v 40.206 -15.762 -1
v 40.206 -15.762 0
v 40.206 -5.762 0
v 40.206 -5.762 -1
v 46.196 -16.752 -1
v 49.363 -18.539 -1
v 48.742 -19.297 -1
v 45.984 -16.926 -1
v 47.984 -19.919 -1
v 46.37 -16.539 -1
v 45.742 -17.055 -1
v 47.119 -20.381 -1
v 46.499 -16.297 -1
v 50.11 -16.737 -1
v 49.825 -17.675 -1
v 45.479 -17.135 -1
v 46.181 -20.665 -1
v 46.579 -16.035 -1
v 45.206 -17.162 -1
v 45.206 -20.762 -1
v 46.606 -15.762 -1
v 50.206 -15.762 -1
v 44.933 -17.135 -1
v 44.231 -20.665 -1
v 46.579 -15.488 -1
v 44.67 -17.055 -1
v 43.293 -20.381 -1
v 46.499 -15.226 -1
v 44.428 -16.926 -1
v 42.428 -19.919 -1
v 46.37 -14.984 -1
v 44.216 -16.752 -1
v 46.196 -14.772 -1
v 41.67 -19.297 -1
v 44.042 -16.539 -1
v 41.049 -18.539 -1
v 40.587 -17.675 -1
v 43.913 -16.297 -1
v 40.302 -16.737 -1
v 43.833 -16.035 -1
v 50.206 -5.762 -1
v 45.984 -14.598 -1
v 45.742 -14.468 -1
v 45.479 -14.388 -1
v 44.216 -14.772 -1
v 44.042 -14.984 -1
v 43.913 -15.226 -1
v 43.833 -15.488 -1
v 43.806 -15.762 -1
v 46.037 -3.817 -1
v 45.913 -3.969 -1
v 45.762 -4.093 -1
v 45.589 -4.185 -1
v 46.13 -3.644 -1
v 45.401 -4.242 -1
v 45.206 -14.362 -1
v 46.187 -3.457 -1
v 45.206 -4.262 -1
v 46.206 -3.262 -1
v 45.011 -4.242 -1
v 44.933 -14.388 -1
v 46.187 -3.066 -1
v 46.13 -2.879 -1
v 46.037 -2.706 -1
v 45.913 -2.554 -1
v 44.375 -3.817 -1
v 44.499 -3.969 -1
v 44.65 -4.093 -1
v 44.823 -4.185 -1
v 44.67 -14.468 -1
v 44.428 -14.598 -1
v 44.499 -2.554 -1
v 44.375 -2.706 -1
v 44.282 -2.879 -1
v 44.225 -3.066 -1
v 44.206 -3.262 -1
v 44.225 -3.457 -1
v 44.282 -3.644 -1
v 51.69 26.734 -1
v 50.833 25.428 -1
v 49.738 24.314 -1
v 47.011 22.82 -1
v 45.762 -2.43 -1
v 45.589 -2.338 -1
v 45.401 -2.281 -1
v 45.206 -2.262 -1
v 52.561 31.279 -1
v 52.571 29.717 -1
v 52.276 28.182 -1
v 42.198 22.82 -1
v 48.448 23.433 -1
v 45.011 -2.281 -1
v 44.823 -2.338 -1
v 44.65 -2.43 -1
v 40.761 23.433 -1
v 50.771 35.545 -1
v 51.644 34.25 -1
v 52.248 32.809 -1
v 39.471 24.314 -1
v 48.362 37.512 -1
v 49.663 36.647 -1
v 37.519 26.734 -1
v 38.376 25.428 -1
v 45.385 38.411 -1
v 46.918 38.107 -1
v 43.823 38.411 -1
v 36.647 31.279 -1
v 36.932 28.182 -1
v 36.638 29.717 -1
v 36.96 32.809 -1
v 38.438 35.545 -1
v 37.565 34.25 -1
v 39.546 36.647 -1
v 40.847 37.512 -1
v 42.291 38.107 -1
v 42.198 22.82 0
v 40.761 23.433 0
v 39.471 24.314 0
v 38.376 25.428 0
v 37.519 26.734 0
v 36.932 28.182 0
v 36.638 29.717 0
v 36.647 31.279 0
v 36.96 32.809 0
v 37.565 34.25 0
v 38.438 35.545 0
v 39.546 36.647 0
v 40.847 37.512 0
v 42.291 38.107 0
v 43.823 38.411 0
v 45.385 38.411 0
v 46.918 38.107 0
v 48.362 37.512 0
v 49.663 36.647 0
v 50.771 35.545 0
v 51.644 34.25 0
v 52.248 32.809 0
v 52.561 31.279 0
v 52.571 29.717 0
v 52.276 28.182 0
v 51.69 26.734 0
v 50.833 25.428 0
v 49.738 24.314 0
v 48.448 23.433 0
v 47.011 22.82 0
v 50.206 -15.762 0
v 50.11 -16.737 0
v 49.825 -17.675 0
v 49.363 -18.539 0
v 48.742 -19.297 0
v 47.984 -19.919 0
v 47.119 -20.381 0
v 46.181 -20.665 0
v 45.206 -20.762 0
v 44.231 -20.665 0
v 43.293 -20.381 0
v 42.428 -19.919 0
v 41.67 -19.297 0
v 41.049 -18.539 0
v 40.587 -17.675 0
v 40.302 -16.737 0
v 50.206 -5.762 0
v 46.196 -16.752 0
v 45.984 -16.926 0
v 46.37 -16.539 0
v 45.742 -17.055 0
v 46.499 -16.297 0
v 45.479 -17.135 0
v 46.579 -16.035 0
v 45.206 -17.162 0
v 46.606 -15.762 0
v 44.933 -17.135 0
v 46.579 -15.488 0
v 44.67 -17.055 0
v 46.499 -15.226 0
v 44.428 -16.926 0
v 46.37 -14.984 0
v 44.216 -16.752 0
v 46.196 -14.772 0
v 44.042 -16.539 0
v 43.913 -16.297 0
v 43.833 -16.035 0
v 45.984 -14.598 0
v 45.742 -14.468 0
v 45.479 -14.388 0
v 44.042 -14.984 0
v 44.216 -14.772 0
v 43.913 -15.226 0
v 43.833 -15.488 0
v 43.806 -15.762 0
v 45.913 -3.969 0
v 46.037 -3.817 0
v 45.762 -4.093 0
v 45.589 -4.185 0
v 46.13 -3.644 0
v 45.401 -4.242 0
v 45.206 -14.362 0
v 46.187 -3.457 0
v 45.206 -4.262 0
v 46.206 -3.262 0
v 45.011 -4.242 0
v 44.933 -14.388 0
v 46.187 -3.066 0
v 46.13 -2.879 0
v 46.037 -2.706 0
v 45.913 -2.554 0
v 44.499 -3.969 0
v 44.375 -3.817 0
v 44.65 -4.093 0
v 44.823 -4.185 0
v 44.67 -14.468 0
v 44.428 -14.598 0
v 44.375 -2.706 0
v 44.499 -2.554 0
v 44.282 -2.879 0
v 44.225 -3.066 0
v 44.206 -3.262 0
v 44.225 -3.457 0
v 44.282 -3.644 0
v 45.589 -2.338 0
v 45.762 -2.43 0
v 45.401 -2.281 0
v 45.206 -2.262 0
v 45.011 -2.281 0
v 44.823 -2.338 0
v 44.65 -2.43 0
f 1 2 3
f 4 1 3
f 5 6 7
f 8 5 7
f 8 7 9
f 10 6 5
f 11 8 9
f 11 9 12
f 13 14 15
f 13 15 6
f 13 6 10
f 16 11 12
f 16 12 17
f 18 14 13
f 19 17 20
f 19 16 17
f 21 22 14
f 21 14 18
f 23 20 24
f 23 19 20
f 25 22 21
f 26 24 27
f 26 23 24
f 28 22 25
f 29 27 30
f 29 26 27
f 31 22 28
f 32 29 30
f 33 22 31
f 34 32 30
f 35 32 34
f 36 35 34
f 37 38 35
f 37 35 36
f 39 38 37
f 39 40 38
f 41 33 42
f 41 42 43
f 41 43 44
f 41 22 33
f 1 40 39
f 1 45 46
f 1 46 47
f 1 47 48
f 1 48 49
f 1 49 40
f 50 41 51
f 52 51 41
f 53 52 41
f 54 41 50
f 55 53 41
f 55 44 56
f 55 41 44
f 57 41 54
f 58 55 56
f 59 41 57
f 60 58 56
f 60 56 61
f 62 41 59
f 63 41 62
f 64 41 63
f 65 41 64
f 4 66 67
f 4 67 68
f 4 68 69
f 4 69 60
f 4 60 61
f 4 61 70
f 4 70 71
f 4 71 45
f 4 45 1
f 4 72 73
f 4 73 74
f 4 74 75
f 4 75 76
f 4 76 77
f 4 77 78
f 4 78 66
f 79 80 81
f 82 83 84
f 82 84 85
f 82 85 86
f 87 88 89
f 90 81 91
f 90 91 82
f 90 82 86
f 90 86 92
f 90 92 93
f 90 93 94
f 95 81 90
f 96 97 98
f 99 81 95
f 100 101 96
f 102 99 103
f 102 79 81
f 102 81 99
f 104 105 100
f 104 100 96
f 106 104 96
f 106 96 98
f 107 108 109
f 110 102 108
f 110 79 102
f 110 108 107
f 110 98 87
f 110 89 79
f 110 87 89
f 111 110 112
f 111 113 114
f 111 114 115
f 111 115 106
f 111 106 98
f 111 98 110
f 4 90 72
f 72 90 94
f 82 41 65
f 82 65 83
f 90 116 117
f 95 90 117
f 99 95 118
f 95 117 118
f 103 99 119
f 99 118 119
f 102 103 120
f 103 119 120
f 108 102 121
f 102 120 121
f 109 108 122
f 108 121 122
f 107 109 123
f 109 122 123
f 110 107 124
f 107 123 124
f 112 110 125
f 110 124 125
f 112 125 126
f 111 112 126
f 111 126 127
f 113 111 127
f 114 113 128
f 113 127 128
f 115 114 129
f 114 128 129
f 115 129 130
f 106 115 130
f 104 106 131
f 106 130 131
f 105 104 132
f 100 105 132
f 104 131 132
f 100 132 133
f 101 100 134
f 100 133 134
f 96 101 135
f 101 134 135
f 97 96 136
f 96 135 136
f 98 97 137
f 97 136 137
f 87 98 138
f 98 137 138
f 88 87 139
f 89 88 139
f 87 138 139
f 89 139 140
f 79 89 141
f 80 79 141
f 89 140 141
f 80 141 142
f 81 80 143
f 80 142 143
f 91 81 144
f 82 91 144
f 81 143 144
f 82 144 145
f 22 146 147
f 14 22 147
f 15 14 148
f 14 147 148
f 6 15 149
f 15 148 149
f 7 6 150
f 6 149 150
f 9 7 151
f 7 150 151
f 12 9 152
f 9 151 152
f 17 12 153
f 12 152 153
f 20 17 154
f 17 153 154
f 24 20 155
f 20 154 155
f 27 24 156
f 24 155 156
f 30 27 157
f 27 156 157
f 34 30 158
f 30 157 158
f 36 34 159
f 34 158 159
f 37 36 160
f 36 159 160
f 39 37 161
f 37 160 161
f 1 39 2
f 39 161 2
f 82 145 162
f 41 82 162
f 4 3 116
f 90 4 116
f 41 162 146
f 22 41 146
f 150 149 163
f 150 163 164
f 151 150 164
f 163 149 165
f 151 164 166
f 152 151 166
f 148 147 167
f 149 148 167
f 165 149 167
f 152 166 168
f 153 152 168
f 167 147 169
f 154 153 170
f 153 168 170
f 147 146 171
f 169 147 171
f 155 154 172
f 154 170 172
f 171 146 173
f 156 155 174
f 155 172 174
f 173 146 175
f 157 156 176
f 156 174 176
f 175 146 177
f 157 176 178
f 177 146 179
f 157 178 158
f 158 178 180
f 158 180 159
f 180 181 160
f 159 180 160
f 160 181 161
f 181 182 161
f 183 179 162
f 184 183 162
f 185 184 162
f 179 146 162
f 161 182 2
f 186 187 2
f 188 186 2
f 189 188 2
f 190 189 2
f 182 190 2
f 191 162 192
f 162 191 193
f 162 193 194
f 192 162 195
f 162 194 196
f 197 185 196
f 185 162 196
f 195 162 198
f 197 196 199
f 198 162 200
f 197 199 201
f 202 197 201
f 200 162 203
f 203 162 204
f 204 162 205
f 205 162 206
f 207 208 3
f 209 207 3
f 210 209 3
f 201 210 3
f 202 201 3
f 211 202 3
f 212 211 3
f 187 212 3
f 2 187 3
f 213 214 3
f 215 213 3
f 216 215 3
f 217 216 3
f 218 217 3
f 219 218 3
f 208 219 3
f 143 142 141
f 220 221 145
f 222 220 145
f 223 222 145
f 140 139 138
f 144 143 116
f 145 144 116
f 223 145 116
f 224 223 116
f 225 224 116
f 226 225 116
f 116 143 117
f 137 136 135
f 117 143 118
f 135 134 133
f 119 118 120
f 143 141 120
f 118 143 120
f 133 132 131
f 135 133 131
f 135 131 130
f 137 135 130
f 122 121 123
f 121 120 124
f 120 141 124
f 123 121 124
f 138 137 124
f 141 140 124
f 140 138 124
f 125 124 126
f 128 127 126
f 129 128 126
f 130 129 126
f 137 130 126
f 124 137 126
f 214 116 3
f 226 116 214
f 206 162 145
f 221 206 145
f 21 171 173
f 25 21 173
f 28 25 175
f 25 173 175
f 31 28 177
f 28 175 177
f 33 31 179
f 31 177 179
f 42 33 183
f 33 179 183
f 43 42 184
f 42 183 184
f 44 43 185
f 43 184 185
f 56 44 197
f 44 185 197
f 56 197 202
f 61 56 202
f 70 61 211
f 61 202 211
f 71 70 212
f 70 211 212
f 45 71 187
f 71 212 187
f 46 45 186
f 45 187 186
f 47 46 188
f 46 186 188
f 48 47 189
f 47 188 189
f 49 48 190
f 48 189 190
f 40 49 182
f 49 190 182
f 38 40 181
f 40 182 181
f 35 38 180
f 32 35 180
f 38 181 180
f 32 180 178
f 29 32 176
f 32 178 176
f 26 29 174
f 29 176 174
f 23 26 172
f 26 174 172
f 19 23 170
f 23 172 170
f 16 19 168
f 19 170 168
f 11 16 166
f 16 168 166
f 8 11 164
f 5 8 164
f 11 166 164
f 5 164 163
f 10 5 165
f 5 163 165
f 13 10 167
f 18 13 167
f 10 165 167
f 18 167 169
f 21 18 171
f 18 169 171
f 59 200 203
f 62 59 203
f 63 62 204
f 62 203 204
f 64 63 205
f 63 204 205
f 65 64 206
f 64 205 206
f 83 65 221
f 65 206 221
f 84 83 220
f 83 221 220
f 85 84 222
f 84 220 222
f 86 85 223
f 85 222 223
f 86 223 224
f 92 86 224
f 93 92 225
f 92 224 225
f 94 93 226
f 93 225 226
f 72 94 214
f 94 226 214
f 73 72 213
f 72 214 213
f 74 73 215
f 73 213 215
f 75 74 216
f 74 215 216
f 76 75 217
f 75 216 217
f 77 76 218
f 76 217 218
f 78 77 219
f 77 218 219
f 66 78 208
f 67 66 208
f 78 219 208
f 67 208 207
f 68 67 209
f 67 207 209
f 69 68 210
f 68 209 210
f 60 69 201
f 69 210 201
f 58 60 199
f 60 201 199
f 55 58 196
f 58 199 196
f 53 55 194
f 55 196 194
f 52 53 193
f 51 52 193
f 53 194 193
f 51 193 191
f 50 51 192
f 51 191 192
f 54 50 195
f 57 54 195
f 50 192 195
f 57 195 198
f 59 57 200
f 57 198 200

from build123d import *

# Parameters (mm, degrees)
MODEL_R           = 1.4
MODEL_R_2         = 1
BRIDA_BASE1_DEPTH = 1


# Sheet-metal steps are written as plain solids
with BuildPart() as part:
    # Model → Brida base1 (new body)
    with BuildSketch(Plane.XY):
        with BuildLine():
            Line((40.2059904, -5.7615616), (42.197855138, 22.819737764))
            ThreePointArc((42.197855138, 22.819737764), (44.604363348, 38.449201588), (47.010871557, 22.819737764))
            Line((47.010871557, 22.819737764), (50.2059904, -5.7615616))
            Line((50.2059904, -5.7615616), (50.2059904, -15.7615616))
            ThreePointArc((50.2059904, -15.7615616), (45.2059904, -20.7615616), (40.2059904, -15.7615616))
            Line((40.2059904, -15.7615616), (40.2059904, -5.7615616))
        make_face()
        with Locations((45.2059904, -15.7615616)):
            Circle(MODEL_R, mode=Mode.SUBTRACT)
        with Locations((45.2059904, -3.2615616)):
            Circle(MODEL_R_2, mode=Mode.SUBTRACT)
    extrude(amount=-BRIDA_BASE1_DEPTH)


solid = part.part
